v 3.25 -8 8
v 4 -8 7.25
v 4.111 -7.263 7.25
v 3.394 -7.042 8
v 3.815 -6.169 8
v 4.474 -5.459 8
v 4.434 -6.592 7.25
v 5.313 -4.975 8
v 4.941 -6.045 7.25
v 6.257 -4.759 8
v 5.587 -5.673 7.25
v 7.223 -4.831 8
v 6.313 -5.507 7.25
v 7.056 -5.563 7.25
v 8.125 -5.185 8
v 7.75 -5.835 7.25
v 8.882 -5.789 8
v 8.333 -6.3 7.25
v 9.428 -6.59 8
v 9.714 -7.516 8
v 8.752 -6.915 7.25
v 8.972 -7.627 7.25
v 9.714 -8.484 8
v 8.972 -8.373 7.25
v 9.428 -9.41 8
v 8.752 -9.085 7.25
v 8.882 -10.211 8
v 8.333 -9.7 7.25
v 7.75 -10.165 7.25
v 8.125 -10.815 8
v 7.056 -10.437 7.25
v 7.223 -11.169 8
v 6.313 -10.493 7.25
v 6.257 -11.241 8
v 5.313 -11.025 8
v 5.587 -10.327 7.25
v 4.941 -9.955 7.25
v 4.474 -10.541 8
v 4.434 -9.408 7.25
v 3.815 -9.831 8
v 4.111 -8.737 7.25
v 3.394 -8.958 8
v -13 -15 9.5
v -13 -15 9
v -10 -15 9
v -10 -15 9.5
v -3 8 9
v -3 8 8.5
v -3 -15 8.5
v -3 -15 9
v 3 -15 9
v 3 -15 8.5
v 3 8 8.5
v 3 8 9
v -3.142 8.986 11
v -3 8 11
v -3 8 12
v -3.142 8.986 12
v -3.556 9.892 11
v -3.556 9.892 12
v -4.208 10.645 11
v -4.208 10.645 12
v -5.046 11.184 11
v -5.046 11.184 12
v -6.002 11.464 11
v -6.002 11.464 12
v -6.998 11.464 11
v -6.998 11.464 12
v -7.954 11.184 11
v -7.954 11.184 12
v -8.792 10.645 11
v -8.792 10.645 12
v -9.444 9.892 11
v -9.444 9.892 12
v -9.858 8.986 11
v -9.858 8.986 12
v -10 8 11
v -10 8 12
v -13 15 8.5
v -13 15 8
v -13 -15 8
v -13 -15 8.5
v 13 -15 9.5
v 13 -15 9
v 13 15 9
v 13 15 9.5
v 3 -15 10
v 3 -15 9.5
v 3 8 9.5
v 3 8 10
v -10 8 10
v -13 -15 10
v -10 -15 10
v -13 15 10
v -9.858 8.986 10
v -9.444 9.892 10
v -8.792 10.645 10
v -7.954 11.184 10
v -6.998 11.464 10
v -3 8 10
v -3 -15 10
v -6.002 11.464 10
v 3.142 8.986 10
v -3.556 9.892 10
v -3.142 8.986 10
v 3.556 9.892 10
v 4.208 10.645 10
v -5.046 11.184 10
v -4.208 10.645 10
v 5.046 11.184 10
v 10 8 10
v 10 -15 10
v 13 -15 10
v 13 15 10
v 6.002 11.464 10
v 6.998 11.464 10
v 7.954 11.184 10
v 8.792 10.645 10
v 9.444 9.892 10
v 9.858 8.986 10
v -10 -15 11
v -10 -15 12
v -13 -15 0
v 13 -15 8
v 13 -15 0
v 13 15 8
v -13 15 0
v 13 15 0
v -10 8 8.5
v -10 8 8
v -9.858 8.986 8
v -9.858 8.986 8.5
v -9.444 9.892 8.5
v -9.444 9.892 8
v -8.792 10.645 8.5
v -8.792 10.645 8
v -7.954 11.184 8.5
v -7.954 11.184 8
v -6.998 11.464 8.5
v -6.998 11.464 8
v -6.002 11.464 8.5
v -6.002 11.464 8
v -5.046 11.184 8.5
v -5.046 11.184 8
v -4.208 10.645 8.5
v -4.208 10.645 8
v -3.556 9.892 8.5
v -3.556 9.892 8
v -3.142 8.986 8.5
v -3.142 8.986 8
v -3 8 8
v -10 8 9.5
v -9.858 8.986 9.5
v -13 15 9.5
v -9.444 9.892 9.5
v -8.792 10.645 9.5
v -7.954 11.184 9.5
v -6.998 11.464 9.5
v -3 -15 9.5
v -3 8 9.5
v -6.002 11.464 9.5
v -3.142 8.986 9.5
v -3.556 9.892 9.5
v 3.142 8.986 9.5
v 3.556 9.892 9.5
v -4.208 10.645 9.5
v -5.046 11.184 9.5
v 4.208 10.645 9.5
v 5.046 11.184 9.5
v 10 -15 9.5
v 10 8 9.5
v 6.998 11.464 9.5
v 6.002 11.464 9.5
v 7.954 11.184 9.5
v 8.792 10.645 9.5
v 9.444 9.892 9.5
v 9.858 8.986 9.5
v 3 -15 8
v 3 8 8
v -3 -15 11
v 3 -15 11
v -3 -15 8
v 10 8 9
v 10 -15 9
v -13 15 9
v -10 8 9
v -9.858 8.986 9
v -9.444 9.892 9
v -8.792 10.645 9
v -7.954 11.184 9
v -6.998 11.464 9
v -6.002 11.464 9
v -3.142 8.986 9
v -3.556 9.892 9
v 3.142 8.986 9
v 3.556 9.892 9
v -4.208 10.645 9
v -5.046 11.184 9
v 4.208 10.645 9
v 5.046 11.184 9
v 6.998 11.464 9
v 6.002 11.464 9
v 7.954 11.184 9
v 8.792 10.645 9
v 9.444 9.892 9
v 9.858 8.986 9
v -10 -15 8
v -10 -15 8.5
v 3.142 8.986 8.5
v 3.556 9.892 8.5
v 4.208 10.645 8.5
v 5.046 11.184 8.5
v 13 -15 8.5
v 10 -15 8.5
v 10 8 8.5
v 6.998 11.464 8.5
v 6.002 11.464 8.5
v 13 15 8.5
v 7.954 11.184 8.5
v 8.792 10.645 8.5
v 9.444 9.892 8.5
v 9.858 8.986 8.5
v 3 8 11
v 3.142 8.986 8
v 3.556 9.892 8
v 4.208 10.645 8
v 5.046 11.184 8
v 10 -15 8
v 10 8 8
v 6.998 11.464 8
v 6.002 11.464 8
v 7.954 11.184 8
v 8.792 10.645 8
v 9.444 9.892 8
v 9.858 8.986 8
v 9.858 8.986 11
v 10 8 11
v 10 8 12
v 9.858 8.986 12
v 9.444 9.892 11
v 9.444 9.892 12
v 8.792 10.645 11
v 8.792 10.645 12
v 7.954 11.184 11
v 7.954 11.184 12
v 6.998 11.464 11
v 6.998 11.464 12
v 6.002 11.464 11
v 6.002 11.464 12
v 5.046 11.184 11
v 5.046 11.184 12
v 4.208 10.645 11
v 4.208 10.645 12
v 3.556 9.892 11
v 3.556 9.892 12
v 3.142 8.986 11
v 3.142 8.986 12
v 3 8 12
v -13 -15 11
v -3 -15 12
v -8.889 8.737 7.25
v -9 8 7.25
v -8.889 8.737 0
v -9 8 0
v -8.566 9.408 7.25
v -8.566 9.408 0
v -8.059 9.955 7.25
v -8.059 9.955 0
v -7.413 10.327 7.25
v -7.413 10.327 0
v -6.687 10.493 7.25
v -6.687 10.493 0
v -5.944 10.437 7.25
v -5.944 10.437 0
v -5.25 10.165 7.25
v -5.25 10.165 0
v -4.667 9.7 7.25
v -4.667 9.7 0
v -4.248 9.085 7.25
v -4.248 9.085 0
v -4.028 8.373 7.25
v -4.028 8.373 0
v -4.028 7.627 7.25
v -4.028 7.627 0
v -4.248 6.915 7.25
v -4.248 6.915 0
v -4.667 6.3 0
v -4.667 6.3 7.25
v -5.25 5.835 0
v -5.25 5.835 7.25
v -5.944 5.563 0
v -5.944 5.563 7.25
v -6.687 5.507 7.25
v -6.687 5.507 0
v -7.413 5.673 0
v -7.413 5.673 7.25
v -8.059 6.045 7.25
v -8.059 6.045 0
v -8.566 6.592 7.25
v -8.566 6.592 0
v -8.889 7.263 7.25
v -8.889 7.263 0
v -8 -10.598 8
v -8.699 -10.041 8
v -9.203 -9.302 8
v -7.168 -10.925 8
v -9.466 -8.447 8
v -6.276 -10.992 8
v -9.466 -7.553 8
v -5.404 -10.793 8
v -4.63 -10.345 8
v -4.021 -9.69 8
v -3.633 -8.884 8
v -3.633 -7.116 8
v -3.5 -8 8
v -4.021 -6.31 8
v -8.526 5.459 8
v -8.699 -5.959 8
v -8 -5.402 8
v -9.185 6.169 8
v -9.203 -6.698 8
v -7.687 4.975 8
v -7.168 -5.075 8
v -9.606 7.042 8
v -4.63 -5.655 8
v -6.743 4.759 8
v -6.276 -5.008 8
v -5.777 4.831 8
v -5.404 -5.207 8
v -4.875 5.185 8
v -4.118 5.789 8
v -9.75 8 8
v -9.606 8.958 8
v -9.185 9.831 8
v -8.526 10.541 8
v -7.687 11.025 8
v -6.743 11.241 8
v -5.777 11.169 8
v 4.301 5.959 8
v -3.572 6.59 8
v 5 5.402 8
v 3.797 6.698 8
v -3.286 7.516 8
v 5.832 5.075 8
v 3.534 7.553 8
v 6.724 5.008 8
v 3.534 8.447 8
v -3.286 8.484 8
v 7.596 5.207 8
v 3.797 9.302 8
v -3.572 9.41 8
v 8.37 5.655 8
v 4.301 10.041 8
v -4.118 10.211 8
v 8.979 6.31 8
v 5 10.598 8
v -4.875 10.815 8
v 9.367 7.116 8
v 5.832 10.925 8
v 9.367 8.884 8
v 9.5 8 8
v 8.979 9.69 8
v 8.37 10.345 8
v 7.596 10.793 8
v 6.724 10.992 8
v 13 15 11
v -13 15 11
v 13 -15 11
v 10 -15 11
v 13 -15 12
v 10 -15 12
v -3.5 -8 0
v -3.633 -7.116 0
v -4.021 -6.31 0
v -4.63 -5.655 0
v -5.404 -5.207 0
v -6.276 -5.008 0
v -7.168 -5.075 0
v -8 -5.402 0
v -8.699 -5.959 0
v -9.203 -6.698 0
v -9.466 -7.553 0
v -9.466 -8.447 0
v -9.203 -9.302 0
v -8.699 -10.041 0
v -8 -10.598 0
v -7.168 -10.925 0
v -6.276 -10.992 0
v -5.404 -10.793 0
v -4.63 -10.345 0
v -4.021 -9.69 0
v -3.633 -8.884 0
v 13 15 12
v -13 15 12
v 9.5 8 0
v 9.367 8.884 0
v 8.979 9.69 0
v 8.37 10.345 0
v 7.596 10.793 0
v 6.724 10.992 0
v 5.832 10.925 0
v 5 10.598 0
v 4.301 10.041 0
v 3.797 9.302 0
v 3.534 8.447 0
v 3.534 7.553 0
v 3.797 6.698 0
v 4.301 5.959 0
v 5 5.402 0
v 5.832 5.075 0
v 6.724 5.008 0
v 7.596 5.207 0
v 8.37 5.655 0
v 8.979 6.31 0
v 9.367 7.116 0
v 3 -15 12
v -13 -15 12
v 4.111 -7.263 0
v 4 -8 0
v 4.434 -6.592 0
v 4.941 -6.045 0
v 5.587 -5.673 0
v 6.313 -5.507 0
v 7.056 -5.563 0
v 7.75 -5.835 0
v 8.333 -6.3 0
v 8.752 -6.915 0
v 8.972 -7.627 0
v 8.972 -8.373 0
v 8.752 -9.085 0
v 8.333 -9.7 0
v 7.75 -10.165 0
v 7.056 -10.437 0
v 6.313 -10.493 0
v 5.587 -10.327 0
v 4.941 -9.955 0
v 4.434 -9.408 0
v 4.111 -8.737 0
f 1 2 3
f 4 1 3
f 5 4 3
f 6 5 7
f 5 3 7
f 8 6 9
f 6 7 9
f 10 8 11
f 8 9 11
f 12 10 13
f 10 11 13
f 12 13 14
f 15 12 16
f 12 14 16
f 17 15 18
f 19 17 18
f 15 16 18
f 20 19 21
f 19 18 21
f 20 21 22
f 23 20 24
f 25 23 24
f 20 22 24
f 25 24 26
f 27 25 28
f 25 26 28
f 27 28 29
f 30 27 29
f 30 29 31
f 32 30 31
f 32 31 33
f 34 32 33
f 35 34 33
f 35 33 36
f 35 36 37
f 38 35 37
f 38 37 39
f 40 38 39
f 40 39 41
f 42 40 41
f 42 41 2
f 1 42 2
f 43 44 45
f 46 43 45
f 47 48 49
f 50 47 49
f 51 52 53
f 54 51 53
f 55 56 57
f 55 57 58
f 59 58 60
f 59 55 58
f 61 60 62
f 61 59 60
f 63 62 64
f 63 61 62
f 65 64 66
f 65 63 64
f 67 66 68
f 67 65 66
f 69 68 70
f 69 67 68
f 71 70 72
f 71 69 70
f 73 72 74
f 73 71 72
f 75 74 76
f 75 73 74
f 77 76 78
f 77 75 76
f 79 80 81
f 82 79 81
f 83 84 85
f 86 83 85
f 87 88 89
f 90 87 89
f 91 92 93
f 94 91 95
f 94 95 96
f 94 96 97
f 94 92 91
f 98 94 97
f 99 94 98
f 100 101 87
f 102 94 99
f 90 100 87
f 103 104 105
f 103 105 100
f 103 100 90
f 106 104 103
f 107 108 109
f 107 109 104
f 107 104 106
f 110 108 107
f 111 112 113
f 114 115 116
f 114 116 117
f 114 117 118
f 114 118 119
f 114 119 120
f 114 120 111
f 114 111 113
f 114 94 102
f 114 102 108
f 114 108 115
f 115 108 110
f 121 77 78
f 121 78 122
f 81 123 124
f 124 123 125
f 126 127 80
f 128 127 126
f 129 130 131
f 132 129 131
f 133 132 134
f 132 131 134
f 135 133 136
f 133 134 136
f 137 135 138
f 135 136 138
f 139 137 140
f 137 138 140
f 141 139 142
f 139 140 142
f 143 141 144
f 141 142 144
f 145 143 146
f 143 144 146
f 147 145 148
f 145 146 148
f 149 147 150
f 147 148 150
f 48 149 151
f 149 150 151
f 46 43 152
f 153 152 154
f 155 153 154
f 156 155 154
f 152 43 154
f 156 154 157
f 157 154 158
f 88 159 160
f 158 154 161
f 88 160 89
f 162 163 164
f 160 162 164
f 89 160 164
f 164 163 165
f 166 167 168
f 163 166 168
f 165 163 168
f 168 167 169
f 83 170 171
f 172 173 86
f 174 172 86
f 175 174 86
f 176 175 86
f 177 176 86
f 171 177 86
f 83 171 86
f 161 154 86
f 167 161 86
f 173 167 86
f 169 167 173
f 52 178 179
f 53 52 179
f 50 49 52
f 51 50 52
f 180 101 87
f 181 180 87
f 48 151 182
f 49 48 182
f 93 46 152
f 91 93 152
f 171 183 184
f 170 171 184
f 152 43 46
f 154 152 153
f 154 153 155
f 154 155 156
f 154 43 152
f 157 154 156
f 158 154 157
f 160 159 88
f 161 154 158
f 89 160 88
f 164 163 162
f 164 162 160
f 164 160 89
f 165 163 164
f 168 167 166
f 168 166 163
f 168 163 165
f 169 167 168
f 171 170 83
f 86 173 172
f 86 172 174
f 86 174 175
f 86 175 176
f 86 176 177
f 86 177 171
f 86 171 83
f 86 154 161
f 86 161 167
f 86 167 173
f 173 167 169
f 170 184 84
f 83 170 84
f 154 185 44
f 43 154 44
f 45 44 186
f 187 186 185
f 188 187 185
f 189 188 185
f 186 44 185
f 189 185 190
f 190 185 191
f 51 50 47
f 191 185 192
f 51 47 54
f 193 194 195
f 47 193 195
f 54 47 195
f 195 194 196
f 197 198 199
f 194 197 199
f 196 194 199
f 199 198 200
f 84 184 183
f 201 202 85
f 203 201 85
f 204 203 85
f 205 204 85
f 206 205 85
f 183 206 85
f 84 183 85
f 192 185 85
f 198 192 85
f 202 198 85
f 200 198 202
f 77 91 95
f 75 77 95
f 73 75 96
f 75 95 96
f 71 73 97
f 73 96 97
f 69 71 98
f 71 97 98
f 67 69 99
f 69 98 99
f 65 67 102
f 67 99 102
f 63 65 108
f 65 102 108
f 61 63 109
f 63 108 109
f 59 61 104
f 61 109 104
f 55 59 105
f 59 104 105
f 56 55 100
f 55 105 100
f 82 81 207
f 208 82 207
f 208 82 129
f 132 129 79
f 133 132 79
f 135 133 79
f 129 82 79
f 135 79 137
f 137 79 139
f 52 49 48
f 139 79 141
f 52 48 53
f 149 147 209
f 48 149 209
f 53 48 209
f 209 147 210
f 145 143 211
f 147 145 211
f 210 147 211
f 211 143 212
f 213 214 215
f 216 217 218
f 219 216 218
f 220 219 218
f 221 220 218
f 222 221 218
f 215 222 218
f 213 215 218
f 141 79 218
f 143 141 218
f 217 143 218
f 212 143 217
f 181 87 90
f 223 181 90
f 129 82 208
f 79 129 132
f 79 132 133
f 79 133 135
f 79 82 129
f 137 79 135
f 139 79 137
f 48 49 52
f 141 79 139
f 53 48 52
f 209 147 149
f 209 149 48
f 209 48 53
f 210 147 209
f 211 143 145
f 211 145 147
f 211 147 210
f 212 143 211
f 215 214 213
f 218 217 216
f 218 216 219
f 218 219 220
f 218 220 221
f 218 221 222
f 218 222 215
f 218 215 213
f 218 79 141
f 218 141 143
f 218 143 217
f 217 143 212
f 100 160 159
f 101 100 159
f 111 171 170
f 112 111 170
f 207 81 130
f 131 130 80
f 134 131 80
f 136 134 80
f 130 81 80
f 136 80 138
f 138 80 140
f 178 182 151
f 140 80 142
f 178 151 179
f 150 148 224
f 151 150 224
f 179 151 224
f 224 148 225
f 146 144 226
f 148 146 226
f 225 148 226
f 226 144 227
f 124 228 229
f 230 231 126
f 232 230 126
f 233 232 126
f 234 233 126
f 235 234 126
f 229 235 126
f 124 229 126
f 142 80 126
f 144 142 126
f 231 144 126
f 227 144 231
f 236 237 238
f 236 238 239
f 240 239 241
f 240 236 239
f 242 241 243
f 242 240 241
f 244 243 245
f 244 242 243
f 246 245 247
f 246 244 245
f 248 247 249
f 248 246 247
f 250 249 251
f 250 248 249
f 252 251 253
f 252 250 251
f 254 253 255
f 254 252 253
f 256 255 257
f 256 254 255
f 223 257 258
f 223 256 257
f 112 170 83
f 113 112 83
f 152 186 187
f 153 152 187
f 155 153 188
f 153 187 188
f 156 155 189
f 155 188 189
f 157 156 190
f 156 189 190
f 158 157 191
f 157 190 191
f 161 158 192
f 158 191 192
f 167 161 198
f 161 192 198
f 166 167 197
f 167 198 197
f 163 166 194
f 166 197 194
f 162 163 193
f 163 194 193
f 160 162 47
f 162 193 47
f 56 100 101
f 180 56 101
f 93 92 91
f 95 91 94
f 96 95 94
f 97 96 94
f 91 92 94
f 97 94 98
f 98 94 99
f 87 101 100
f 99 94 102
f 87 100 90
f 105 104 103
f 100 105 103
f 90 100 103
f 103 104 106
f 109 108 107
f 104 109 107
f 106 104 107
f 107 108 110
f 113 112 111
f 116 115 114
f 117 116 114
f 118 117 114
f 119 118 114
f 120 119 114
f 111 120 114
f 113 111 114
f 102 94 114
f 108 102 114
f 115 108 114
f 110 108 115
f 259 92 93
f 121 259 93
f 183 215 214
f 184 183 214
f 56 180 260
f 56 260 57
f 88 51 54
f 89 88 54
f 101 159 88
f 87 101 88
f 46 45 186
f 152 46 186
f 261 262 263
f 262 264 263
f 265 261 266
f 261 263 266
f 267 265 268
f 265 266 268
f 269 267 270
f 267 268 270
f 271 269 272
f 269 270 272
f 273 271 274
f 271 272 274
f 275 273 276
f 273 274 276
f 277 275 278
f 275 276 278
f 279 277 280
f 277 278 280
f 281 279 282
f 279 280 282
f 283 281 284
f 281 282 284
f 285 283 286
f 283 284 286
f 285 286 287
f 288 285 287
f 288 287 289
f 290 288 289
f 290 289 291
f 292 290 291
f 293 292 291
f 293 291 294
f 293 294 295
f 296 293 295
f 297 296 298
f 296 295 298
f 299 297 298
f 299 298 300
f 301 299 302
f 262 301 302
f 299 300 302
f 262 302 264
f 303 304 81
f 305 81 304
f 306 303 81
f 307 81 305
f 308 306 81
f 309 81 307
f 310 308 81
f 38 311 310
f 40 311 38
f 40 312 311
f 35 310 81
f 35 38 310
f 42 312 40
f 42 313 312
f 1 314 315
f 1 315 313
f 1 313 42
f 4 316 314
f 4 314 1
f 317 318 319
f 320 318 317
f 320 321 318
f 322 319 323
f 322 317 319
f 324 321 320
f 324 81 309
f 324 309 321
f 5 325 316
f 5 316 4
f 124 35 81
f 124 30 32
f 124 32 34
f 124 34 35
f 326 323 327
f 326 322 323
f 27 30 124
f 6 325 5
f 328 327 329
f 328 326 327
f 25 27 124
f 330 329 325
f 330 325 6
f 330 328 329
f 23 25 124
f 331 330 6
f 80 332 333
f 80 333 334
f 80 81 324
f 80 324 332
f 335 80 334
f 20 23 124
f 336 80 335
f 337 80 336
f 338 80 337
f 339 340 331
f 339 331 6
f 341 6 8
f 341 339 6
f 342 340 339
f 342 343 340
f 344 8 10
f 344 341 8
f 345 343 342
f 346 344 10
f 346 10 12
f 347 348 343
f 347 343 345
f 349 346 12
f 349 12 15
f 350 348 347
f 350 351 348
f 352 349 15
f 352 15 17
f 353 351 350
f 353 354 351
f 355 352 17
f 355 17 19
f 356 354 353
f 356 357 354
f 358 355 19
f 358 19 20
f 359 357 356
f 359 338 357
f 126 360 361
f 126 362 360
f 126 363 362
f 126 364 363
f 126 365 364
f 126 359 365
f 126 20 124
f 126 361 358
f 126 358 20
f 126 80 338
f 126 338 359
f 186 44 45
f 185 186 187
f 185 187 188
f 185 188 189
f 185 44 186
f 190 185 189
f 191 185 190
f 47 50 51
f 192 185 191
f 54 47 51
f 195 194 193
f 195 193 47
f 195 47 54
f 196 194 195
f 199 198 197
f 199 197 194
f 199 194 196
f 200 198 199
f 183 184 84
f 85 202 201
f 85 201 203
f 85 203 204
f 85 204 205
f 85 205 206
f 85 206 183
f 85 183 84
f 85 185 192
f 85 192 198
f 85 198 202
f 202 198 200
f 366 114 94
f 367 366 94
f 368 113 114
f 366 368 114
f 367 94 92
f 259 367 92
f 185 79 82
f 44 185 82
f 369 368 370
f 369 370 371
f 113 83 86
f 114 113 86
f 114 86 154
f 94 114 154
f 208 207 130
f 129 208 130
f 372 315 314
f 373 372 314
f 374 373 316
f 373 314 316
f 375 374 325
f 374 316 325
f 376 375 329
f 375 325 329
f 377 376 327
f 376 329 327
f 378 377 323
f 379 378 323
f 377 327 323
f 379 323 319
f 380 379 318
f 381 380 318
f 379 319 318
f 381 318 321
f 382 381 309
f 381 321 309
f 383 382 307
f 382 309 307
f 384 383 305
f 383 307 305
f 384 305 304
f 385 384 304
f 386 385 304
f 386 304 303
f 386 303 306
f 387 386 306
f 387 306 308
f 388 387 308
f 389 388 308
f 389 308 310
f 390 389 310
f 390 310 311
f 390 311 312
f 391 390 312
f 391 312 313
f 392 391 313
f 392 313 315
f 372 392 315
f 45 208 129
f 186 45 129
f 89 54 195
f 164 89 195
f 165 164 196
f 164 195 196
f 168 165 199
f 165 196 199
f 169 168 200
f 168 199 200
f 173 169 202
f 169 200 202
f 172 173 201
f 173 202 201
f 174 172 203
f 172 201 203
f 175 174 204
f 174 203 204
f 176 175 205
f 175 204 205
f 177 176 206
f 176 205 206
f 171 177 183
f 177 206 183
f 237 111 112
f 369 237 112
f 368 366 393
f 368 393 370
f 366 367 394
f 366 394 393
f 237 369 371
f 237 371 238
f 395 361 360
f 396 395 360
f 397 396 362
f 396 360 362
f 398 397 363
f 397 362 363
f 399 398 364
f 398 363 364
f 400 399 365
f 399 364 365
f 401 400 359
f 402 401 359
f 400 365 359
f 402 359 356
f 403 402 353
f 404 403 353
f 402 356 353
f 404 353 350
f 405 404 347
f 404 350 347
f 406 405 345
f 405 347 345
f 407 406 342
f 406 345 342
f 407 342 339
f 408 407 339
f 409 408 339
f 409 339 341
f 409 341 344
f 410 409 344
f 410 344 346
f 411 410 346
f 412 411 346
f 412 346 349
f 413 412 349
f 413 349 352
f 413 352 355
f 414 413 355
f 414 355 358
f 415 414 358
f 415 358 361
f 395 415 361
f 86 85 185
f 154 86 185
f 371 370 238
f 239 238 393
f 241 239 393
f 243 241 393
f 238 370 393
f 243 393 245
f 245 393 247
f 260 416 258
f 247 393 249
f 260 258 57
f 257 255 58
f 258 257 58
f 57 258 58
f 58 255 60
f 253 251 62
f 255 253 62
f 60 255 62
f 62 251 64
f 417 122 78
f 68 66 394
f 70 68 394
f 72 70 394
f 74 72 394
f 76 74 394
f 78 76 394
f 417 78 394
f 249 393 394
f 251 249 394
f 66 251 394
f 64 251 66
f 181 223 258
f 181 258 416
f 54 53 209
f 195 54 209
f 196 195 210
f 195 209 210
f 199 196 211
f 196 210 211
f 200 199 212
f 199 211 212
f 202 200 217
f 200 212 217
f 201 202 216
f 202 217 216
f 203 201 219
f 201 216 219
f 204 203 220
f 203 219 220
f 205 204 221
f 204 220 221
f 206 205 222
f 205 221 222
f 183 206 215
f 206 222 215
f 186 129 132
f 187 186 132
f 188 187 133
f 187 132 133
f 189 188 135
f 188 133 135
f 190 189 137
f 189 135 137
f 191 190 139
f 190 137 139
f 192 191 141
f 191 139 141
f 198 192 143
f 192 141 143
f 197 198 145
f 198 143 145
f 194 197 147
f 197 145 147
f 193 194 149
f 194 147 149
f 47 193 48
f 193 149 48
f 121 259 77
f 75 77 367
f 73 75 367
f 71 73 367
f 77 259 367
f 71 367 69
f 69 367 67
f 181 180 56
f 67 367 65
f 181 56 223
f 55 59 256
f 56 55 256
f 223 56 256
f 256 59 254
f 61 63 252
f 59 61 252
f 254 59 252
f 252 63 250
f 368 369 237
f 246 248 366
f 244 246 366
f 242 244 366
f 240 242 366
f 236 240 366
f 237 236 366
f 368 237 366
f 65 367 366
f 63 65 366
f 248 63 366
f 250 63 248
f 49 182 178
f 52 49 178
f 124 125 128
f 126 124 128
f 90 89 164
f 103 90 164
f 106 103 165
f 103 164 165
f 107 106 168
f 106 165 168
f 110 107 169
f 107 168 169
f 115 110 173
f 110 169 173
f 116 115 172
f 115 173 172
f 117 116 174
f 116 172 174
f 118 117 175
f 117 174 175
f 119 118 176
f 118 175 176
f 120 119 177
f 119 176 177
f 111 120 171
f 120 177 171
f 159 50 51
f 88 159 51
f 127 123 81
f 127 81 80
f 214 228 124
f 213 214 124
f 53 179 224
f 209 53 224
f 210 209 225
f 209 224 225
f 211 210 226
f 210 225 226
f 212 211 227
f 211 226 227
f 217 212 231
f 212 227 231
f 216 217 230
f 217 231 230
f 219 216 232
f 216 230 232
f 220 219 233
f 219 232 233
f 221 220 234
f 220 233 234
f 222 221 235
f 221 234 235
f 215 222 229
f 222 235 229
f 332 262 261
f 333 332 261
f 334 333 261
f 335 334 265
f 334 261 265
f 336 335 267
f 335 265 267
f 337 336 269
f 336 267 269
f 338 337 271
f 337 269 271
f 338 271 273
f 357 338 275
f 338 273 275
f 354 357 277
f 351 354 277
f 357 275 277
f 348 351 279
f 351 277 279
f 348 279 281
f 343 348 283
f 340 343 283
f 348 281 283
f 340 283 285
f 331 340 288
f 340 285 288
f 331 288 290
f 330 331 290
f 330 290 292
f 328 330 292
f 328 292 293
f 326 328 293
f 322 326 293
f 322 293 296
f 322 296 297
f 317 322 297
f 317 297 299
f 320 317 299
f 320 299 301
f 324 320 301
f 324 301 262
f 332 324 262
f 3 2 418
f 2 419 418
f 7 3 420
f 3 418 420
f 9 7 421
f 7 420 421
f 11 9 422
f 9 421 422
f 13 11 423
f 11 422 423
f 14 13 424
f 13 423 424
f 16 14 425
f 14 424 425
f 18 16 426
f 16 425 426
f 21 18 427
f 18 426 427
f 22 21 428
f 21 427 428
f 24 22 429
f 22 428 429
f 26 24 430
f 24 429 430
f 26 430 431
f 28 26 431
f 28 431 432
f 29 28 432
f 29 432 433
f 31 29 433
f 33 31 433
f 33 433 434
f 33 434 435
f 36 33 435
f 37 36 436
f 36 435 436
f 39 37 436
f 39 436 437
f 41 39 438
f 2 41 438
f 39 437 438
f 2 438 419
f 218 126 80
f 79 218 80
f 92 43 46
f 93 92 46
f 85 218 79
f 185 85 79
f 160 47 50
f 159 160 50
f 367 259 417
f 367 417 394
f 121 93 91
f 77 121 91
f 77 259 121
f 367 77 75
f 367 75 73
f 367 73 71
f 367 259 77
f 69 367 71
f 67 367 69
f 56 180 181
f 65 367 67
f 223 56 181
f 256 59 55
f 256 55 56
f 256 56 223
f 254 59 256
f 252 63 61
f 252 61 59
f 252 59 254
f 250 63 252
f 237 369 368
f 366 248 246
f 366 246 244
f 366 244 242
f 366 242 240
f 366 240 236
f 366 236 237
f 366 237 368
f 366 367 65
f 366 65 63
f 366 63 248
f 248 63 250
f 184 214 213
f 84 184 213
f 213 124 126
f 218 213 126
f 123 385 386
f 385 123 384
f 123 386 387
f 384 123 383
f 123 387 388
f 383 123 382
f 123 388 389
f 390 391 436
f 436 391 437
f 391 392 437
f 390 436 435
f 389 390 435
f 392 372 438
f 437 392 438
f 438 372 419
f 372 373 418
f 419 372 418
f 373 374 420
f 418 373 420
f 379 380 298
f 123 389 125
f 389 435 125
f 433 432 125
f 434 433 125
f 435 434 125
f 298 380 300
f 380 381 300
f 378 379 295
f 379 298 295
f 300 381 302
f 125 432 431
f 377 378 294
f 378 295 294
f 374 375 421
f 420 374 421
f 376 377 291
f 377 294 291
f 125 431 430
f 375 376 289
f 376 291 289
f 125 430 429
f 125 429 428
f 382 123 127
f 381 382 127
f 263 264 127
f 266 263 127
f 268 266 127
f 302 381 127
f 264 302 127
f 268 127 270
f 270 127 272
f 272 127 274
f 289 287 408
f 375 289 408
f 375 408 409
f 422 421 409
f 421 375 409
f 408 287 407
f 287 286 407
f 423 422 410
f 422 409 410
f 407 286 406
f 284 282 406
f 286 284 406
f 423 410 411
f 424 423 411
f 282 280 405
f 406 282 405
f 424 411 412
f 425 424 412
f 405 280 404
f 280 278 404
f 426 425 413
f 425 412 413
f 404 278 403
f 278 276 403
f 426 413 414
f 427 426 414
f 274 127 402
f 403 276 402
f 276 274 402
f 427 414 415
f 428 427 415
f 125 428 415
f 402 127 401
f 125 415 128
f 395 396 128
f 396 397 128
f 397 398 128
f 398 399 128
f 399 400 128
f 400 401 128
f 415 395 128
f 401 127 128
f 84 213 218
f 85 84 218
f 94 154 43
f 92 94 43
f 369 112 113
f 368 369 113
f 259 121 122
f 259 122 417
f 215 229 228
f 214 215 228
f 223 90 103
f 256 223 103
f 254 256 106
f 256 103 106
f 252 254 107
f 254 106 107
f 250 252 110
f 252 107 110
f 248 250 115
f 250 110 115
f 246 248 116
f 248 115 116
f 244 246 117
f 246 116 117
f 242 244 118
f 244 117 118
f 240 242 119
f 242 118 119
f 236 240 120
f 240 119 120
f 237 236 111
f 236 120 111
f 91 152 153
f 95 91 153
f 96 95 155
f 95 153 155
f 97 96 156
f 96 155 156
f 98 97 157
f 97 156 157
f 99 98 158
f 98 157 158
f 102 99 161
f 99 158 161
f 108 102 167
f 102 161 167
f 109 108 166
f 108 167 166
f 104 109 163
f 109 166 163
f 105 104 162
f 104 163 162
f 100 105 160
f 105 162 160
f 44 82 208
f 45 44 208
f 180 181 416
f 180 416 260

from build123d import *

# Parameters (mm, degrees)
SKETCH_1_W             = 26
SKETCH_1_H             = 30
EXTRUDE_654_DEPTH      = 8
SKETCH_2_R             = 3
CUT_EXTRUDE_976_DEPTH  = 22.400934559
M6X1_01_D              = 5
M6X1_01_CSINK_D        = 6.5
M6X1_01_CSINK_ANGLE    = 90
EXTRUDE_3_DEPTH        = 4
SPLIT_START            = 8
SPLIT_BODIES_1_DEPTH   = 3
SPLIT_START_2          = 10
SPLIT_BODIES_1_2_DEPTH = 1
SPLIT_START_3          = 9.5
SPLIT_BODIES_1_3_DEPTH = 0.5
SPLIT_START_4          = 9
SPLIT_BODIES_1_4_DEPTH = 0.5
SPLIT_START_5          = 8.5
SPLIT_BODIES_1_5_DEPTH = 0.5
SPLIT_BODIES_1_6_DEPTH = 0.5


# Read off the part's stored shape, not the designer's step: Разделить1
with BuildPart() as part:
    # Эскиз1 → Extrude 654 (new body)
    with BuildSketch(Plane.XY):
        Rectangle(SKETCH_1_W, SKETCH_1_H)
    extrude(amount=EXTRUDE_654_DEPTH)

    # Эскиз2 → Cut-Extrude 976 (cut, through all)
    with BuildSketch(Plane.XY.offset(8)):
        with Locations((-6.5, -8)):
            Circle(SKETCH_2_R)
        with Locations((6.5, 8)):
            Circle(SKETCH_2_R)
    extrude(amount=-CUT_EXTRUDE_976_DEPTH, mode=Mode.SUBTRACT)

    # Отверстие обработанное метчиком M6x1.01 (through all)
    with Locations(Plane(origin=(-6.5, 8, 8), x_dir=(1, 0, 0), z_dir=(0, 0, 1))):
        with Locations((0, 0), (13, -16)):
            CounterSinkHole(M6X1_01_D / 2, M6X1_01_CSINK_D / 2, counter_sink_angle=M6X1_01_CSINK_ANGLE)


with BuildPart() as body_2:
    # Эскиз4 → Вытянуть3 (new body)
    with BuildSketch(Plane.XY.offset(8)):
        with BuildLine():
            Line((-10, 8), (-10, -15))
            Line((-10, -15), (-13, -15))
            Line((-13, -15), (-13, 15))
            Line((-13, 15), (13, 15))
            Line((13, 15), (13, -15))
            Line((13, -15), (10, -15))
            Line((10, -15), (10, 8))
            ThreePointArc((10, 8), (6.5, 11.5), (3, 8))
            Line((3, 8), (3, -15))
            Line((3, -15), (-3, -15))
            Line((-3, -15), (-3, 8))
            ThreePointArc((-3, 8), (-6.5, 11.5), (-10, 8))
        make_face()
    extrude(amount=EXTRUDE_3_DEPTH)

    # Split Bodies 1 outline → Split Bodies 1 (cut)
    with BuildSketch(Plane.XY.offset(SPLIT_START)):
        with BuildLine():
            Line((10, -15), (13, -15))
            Line((13, -15), (13, 15))
            Line((13, 15), (-13, 15))
            Line((-13, 15), (-13, -15))
            Line((-13, -15), (-10, -15))
            Line((-10, -15), (-10, 8))
            ThreePointArc((-10, 8), (-6.5, 11.5), (-3, 8))
            Line((-3, 8), (-3, -15))
            Line((-3, -15), (3, -15))
            Line((3, -15), (3, 8))
            ThreePointArc((3, 8), (6.5, 11.5), (10, 8))
            Line((10, 8), (10, -15))
        make_face()
    extrude(amount=SPLIT_BODIES_1_DEPTH, mode=Mode.SUBTRACT)


with BuildPart() as body_3:
    # Split Bodies 1 2 outline → Split Bodies 1 2 (new body)
    with BuildSketch(Plane.XY.offset(SPLIT_START_2)):
        with BuildLine():
            Line((13, -15), (13, 15))
            Line((13, 15), (-13, 15))
            Line((-13, 15), (-13, -15))
            Line((-13, -15), (-10, -15))
            Line((-10, -15), (-10, 8))
            ThreePointArc((-10, 8), (-6.5, 11.5), (-3, 8))
            Line((-3, 8), (-3, -15))
            Line((-3, -15), (3, -15))
            Line((3, -15), (3, 8))
            ThreePointArc((3, 8), (6.5, 11.5), (10, 8))
            Line((10, 8), (10, -15))
            Line((10, -15), (13, -15))
        make_face()
    extrude(amount=SPLIT_BODIES_1_2_DEPTH)


with BuildPart() as body_4:
    # Split Bodies 1 3 outline → Split Bodies 1 3 (new body)
    with BuildSketch(Plane.XY.offset(SPLIT_START_3)):
        with BuildLine():
            Line((13, -15), (13, 15))
            Line((13, 15), (-13, 15))
            Line((-13, 15), (-13, -15))
            Line((-13, -15), (-10, -15))
            Line((-10, -15), (-10, 8))
            ThreePointArc((-10, 8), (-6.5, 11.5), (-3, 8))
            Line((-3, 8), (-3, -15))
            Line((-3, -15), (3, -15))
            Line((3, -15), (3, 8))
            ThreePointArc((3, 8), (6.5, 11.5), (10, 8))
            Line((10, 8), (10, -15))
            Line((10, -15), (13, -15))
        make_face()
    extrude(amount=SPLIT_BODIES_1_3_DEPTH)


with BuildPart() as body_5:
    # Split Bodies 1 4 outline → Split Bodies 1 4 (new body)
    with BuildSketch(Plane.XY.offset(SPLIT_START_4)):
        with BuildLine():
            Line((13, -15), (13, 15))
            Line((13, 15), (-13, 15))
            Line((-13, 15), (-13, -15))
            Line((-13, -15), (-10, -15))
            Line((-10, -15), (-10, 8))
            ThreePointArc((-10, 8), (-6.5, 11.5), (-3, 8))
            Line((-3, 8), (-3, -15))
            Line((-3, -15), (3, -15))
            Line((3, -15), (3, 8))
            ThreePointArc((3, 8), (6.5, 11.5), (10, 8))
            Line((10, 8), (10, -15))
            Line((10, -15), (13, -15))
        make_face()
    extrude(amount=SPLIT_BODIES_1_4_DEPTH)


with BuildPart() as body_6:
    # Split Bodies 1 5 outline → Split Bodies 1 5 (new body)
    with BuildSketch(Plane.XY.offset(SPLIT_START_5)):
        with BuildLine():
            Line((13, -15), (13, 15))
            Line((13, 15), (-13, 15))
            Line((-13, 15), (-13, -15))
            Line((-13, -15), (-10, -15))
            Line((-10, -15), (-10, 8))
            ThreePointArc((-10, 8), (-6.5, 11.5), (-3, 8))
            Line((-3, 8), (-3, -15))
            Line((-3, -15), (3, -15))
            Line((3, -15), (3, 8))
            ThreePointArc((3, 8), (6.5, 11.5), (10, 8))
            Line((10, 8), (10, -15))
            Line((10, -15), (13, -15))
        make_face()
    extrude(amount=SPLIT_BODIES_1_5_DEPTH)


with BuildPart() as body_7:
    # Split Bodies 1 6 outline → Split Bodies 1 6 (new body)
    with BuildSketch(Plane.XY.offset(SPLIT_START)):
        with BuildLine():
            Line((13, -15), (13, 15))
            Line((13, 15), (-13, 15))
            Line((-13, 15), (-13, -15))
            Line((-13, -15), (-10, -15))
            Line((-10, -15), (-10, 8))
            ThreePointArc((-10, 8), (-6.5, 11.5), (-3, 8))
            Line((-3, 8), (-3, -15))
            Line((-3, -15), (3, -15))
            Line((3, -15), (3, 8))
            ThreePointArc((3, 8), (6.5, 11.5), (10, 8))
            Line((10, 8), (10, -15))
            Line((10, -15), (13, -15))
        make_face()
    extrude(amount=SPLIT_BODIES_1_6_DEPTH)


solid = Compound([part.part, body_2.part, body_3.part, body_4.part, body_5.part, body_6.part, body_7.part])
